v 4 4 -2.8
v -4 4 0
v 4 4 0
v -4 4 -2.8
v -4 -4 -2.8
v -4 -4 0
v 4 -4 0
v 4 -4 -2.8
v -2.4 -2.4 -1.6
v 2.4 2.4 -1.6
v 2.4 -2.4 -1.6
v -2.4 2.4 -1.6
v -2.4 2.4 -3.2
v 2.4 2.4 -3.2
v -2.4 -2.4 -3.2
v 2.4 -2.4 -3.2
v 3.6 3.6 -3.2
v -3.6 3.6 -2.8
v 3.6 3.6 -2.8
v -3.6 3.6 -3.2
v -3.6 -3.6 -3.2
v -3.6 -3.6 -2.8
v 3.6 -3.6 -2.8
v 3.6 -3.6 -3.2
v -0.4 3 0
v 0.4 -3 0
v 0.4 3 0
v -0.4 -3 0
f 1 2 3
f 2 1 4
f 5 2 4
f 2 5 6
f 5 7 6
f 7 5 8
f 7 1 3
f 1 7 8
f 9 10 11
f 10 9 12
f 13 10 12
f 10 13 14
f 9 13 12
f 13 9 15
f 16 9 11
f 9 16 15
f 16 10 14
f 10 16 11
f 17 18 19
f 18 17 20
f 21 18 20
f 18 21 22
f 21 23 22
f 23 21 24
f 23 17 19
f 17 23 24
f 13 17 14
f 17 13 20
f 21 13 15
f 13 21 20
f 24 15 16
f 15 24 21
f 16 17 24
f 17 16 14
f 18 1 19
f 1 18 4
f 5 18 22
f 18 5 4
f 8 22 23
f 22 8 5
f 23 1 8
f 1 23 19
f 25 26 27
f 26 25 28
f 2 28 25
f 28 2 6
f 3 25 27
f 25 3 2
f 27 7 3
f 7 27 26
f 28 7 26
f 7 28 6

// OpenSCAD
// file: ../p/4-4edge.scad
use <../lib.scad>
$fa=1; $fs=0.2;
function ldraw_lib__4_4edge(realsolid=false) = [
// 0 Circle 1.0
// 0 Name: 4-4edge.dat
// 0 Author: James Jessiman
// 0 !LDRAW_ORG Primitive UPDATE 2017-01
// 0 !LICENSE Licensed under CC BY 2.0 and CC BY 4.0 : see CAreadme.txt
// 
// 0 BFC CERTIFY CCW
  [0,"BFC","CERTIFY"],
  [0,"BFC","CCW"],
// 
// 0 !HISTORY 1998-12-15 [PTadmin] Official Update 1998-10
// 0 !HISTORY 2005-12-28 [PTadmin] Official Update 2005-01
// 0 !HISTORY 2007-06-24 [PTadmin] Header formatted for Contributor Agreement
// 0 !HISTORY 2008-07-01 [PTadmin] Official Update 2008-01
// 0 !HISTORY 2017-01-15 [Steffen] BFCed
// 0 !HISTORY 2017-12-30 [PTadmin] Official Update 2017-01
// 
// 
// 2 24 1 0 0 0.9239 0 0.3827
  [2,24,1,0,0,0.9239,0,0.3827],
// 2 24 0.9239 0 0.3827 0.7071 0 0.7071
  [2,24,0.9239,0,0.3827,0.7071,0,0.7071],
// 2 24 0.7071 0 0.7071 0.3827 0 0.9239
  [2,24,0.7071,0,0.7071,0.3827,0,0.9239],
// 2 24 0.3827 0 0.9239 0 0 1
  [2,24,0.3827,0,0.9239,0,0,1],
// 2 24 0 0 1 -0.3827 0 0.9239
  [2,24,0,0,1,-0.3827,0,0.9239],
// 2 24 -0.3827 0 0.9239 -0.7071 0 0.7071
  [2,24,-0.3827,0,0.9239,-0.7071,0,0.7071],
// 2 24 -0.7071 0 0.7071 -0.9239 0 0.3827
  [2,24,-0.7071,0,0.7071,-0.9239,0,0.3827],
// 2 24 -0.9239 0 0.3827 -1 0 -0
  [2,24,-0.9239,0,0.3827,-1,0,-0],
// 2 24 -1 0 -0 -0.9239 0 -0.3827
  [2,24,-1,0,-0,-0.9239,0,-0.3827],
// 2 24 -0.9239 0 -0.3827 -0.7071 0 -0.7071
  [2,24,-0.9239,0,-0.3827,-0.7071,0,-0.7071],
// 2 24 -0.7071 0 -0.7071 -0.3827 0 -0.9239
  [2,24,-0.7071,0,-0.7071,-0.3827,0,-0.9239],
// 2 24 -0.3827 0 -0.9239 0 0 -1
  [2,24,-0.3827,0,-0.9239,0,0,-1],
// 2 24 0 0 -1 0.3827 0 -0.9239
  [2,24,0,0,-1,0.3827,0,-0.9239],
// 2 24 0.3827 0 -0.9239 0.7071 0 -0.7071
  [2,24,0.3827,0,-0.9239,0.7071,0,-0.7071],
// 2 24 0.7071 0 -0.7071 0.9239 0 -0.3827
  [2,24,0.7071,0,-0.7071,0.9239,0,-0.3827],
// 2 24 0.9239 0 -0.3827 1 0 0
  [2,24,0.9239,0,-0.3827,1,0,0],
];
module ldraw_lib__4_4edge(step=0, col=false, unit=2/5, alt=false, line=0.2, solid=!$preview)
    makepoly(ldraw_lib__4_4edge(solid), step=step, col=col, unit=unit, alt=alt, line=line, solid=solid);
ldraw_lib__4_4edge(line=0.2);
// file: ../p/4-4disc.scad
use <../lib.scad>
$fa=1; $fs=0.2;
function ldraw_lib__4_4disc(realsolid=false) = [
// 0 Disc 1.0
// 0 Name: 4-4disc.dat
// 0 Author: James Jessiman
// 0 !LDRAW_ORG Primitive UPDATE 2002-02
// 0 !LICENSE Licensed under CC BY 2.0 and CC BY 4.0 : see CAreadme.txt
// 
// 0 BFC CERTIFY CCW
  [0,"BFC","CERTIFY"],
  [0,"BFC","CCW"],
// 
// 0 !HISTORY 1998-12-15 [PTadmin] Official Update 1998-10
// 0 !HISTORY 2002-03-23 [sbliss] Added BFC statement
// 0 !HISTORY 2002-04-25 [PTadmin] Official Update 2002-02
// 0 !HISTORY 2007-06-24 [PTadmin] Header formatted for Contributor Agreement
// 0 !HISTORY 2008-07-01 [PTadmin] Official Update 2008-01
// 
// 
// 3 16 0 0 0 1 0 0 0.9239 0 0.3827
  [3,16,0,0,0,1,0,0,0.9239,0,0.3827],
// 3 16 0 0 0 0.9239 0 0.3827 0.7071 0 0.7071
  [3,16,0,0,0,0.9239,0,0.3827,0.7071,0,0.7071],
// 3 16 0 0 0 0.7071 0 0.7071 0.3827 0 0.9239
  [3,16,0,0,0,0.7071,0,0.7071,0.3827,0,0.9239],
// 3 16 0 0 0 0.3827 0 0.9239 0 0 1
  [3,16,0,0,0,0.3827,0,0.9239,0,0,1],
// 3 16 0 0 0 0 0 1 -0.3827 0 0.9239
  [3,16,0,0,0,0,0,1,-0.3827,0,0.9239],
// 3 16 0 0 0 -0.3827 0 0.9239 -0.7071 0 0.7071
  [3,16,0,0,0,-0.3827,0,0.9239,-0.7071,0,0.7071],
// 3 16 0 0 0 -0.7071 0 0.7071 -0.9239 0 0.3827
  [3,16,0,0,0,-0.7071,0,0.7071,-0.9239,0,0.3827],
// 3 16 0 0 0 -0.9239 0 0.3827 -1 0 -0
  [3,16,0,0,0,-0.9239,0,0.3827,-1,0,-0],
// 3 16 0 0 0 -1 0 -0 -0.9239 0 -0.3827
  [3,16,0,0,0,-1,0,-0,-0.9239,0,-0.3827],
// 3 16 0 0 0 -0.9239 0 -0.3827 -0.7071 0 -0.7071
  [3,16,0,0,0,-0.9239,0,-0.3827,-0.7071,0,-0.7071],
// 3 16 0 0 0 -0.7071 0 -0.7071 -0.3827 0 -0.9239
  [3,16,0,0,0,-0.7071,0,-0.7071,-0.3827,0,-0.9239],
// 3 16 0 0 0 -0.3827 0 -0.9239 0 0 -1
  [3,16,0,0,0,-0.3827,0,-0.9239,0,0,-1],
// 3 16 0 0 0 0 0 -1 0.3827 0 -0.9239
  [3,16,0,0,0,0,0,-1,0.3827,0,-0.9239],
// 3 16 0 0 0 0.3827 0 -0.9239 0.7071 0 -0.7071
  [3,16,0,0,0,0.3827,0,-0.9239,0.7071,0,-0.7071],
// 3 16 0 0 0 0.7071 0 -0.7071 0.9239 0 -0.3827
  [3,16,0,0,0,0.7071,0,-0.7071,0.9239,0,-0.3827],
// 3 16 0 0 0 0.9239 0 -0.3827 1 0 0
  [3,16,0,0,0,0.9239,0,-0.3827,1,0,0],
// 0
];
module ldraw_lib__4_4disc(step=0, col=false, unit=2/5, alt=false, line=0.2, solid=!$preview)
    makepoly(ldraw_lib__4_4disc(solid), step=step, col=col, unit=unit, alt=alt, line=line, solid=solid);
ldraw_lib__4_4disc(line=0.2);
// file: ../p/4-4cyli.scad
use <../lib.scad>
$fa=1; $fs=0.2;
function ldraw_lib__4_4cyli(realsolid=false) = [
// 0 Cylinder 1.0
// 0 Name: 4-4cyli.dat
// 0 Author: James Jessiman
// 0 !LDRAW_ORG Primitive UPDATE 2005-01
// 0 !LICENSE Licensed under CC BY 2.0 and CC BY 4.0 : see CAreadme.txt
// 
// 0 BFC CERTIFY CCW
  [0,"BFC","CERTIFY"],
  [0,"BFC","CCW"],
// 
// 0 !HISTORY 1998-12-15 [PTadmin] Official Update 1998-10
// 0 !HISTORY 2002-03-23 [sbliss] Added BFC statement; merged headers from files in distributions LDraw 0.27 and Complete.
// 0 !HISTORY 2002-04-25 [PTadmin] Official Update 2002-02
// 0 !HISTORY 2004-12-14 [guyvivan] BFC CCW
// 0 !HISTORY 2005-12-28 [PTadmin] Official Update 2005-01
// 0 !HISTORY 2007-06-24 [PTadmin] Header formatted for Contributor Agreement
// 0 !HISTORY 2008-07-01 [PTadmin] Official Update 2008-01
// 
// 
// 4 16 1 1 0 0.9239 1 0.3827 0.9239 0 0.3827 1 0 0
  [4,16,1,1,0,0.9239,1,0.3827,0.9239,0,0.3827,1,0,0],
// 5 24 1 0 0 1 1 0 0.9239 0 0.3827 0.9239 0 -0.3827
  [5,24,1,0,0,1,1,0,0.9239,0,0.3827,0.9239,0,-0.3827],
// 4 16 0.9239 1 0.3827 0.7071 1 0.7071 0.7071 0 0.7071 0.9239 0 0.3827
  [4,16,0.9239,1,0.3827,0.7071,1,0.7071,0.7071,0,0.7071,0.9239,0,0.3827],
// 5 24 0.9239 0 0.3827 0.9239 1 0.3827 0.7071 0 0.7071 1 0 0
  [5,24,0.9239,0,0.3827,0.9239,1,0.3827,0.7071,0,0.7071,1,0,0],
// 4 16 0.7071 1 0.7071 0.3827 1 0.9239 0.3827 0 0.9239 0.7071 0 0.7071
  [4,16,0.7071,1,0.7071,0.3827,1,0.9239,0.3827,0,0.9239,0.7071,0,0.7071],
// 5 24 0.7071 0 0.7071 0.7071 1 0.7071 0.3827 0 0.9239 0.9239 0 0.3827
  [5,24,0.7071,0,0.7071,0.7071,1,0.7071,0.3827,0,0.9239,0.9239,0,0.3827],
// 4 16 0.3827 1 0.9239 0 1 1 0 0 1 0.3827 0 0.9239
  [4,16,0.3827,1,0.9239,0,1,1,0,0,1,0.3827,0,0.9239],
// 5 24 0.3827 0 0.9239 0.3827 1 0.9239 0 0 1 0.7071 0 0.7071
  [5,24,0.3827,0,0.9239,0.3827,1,0.9239,0,0,1,0.7071,0,0.7071],
// 4 16 0 1 1 -0.3827 1 0.9239 -0.3827 0 0.9239 0 0 1
  [4,16,0,1,1,-0.3827,1,0.9239,-0.3827,0,0.9239,0,0,1],
// 5 24 0 0 1 0 1 1 -0.3827 0 0.9239 0.3827 0 0.9239
  [5,24,0,0,1,0,1,1,-0.3827,0,0.9239,0.3827,0,0.9239],
// 4 16 -0.3827 1 0.9239 -0.7071 1 0.7071 -0.7071 0 0.7071 -0.3827 0 0.9239
  [4,16,-0.3827,1,0.9239,-0.7071,1,0.7071,-0.7071,0,0.7071,-0.3827,0,0.9239],
// 5 24 -0.3827 0 0.9239 -0.3827 1 0.9239 -0.7071 0 0.7071 0 0 1
  [5,24,-0.3827,0,0.9239,-0.3827,1,0.9239,-0.7071,0,0.7071,0,0,1],
// 4 16 -0.7071 1 0.7071 -0.9239 1 0.3827 -0.9239 0 0.3827 -0.7071 0 0.7071
  [4,16,-0.7071,1,0.7071,-0.9239,1,0.3827,-0.9239,0,0.3827,-0.7071,0,0.7071],
// 5 24 -0.7071 0 0.7071 -0.7071 1 0.7071 -0.9239 0 0.3827 -0.3827 0 0.9239
  [5,24,-0.7071,0,0.7071,-0.7071,1,0.7071,-0.9239,0,0.3827,-0.3827,0,0.9239],
// 4 16 -0.9239 1 0.3827 -1 1 0 -1 0 0 -0.9239 0 0.3827
  [4,16,-0.9239,1,0.3827,-1,1,0,-1,0,0,-0.9239,0,0.3827],
// 5 24 -0.9239 0 0.3827 -0.9239 1 0.3827 -1 0 0 -0.7071 0 0.7071
  [5,24,-0.9239,0,0.3827,-0.9239,1,0.3827,-1,0,0,-0.7071,0,0.7071],
// 4 16 -1 1 0 -0.9239 1 -0.3827 -0.9239 0 -0.3827 -1 0 0
  [4,16,-1,1,0,-0.9239,1,-0.3827,-0.9239,0,-0.3827,-1,0,0],
// 5 24 -1 0 0 -1 1 0 -0.9239 0 -0.3827 -0.9239 0 0.3827
  [5,24,-1,0,0,-1,1,0,-0.9239,0,-0.3827,-0.9239,0,0.3827],
// 4 16 -0.9239 1 -0.3827 -0.7071 1 -0.7071 -0.7071 0 -0.7071 -0.9239 0 -0.3827
  [4,16,-0.9239,1,-0.3827,-0.7071,1,-0.7071,-0.7071,0,-0.7071,-0.9239,0,-0.3827],
// 5 24 -0.9239 0 -0.3827 -0.9239 1 -0.3827 -0.7071 0 -0.7071 -1 0 0
  [5,24,-0.9239,0,-0.3827,-0.9239,1,-0.3827,-0.7071,0,-0.7071,-1,0,0],
// 4 16 -0.7071 1 -0.7071 -0.3827 1 -0.9239 -0.3827 0 -0.9239 -0.7071 0 -0.7071
  [4,16,-0.7071,1,-0.7071,-0.3827,1,-0.9239,-0.3827,0,-0.9239,-0.7071,0,-0.7071],
// 5 24 -0.7071 0 -0.7071 -0.7071 1 -0.7071 -0.3827 0 -0.9239 -0.9239 0 -0.3827
  [5,24,-0.7071,0,-0.7071,-0.7071,1,-0.7071,-0.3827,0,-0.9239,-0.9239,0,-0.3827],
// 4 16 -0.3827 1 -0.9239 0 1 -1 0 0 -1 -0.3827 0 -0.9239
  [4,16,-0.3827,1,-0.9239,0,1,-1,0,0,-1,-0.3827,0,-0.9239],
// 5 24 -0.3827 0 -0.9239 -0.3827 1 -0.9239 0 0 -1 -0.7071 0 -0.7071
  [5,24,-0.3827,0,-0.9239,-0.3827,1,-0.9239,0,0,-1,-0.7071,0,-0.7071],
// 4 16 0 1 -1 0.3827 1 -0.9239 0.3827 0 -0.9239 0 0 -1
  [4,16,0,1,-1,0.3827,1,-0.9239,0.3827,0,-0.9239,0,0,-1],
// 5 24 0 0 -1 0 1 -1 0.3827 0 -0.9239 -0.3827 0 -0.9239
  [5,24,0,0,-1,0,1,-1,0.3827,0,-0.9239,-0.3827,0,-0.9239],
// 4 16 0.3827 1 -0.9239 0.7071 1 -0.7071 0.7071 0 -0.7071 0.3827 0 -0.9239
  [4,16,0.3827,1,-0.9239,0.7071,1,-0.7071,0.7071,0,-0.7071,0.3827,0,-0.9239],
// 5 24 0.3827 0 -0.9239 0.3827 1 -0.9239 0.7071 0 -0.7071 0 0 -1
  [5,24,0.3827,0,-0.9239,0.3827,1,-0.9239,0.7071,0,-0.7071,0,0,-1],
// 4 16 0.7071 1 -0.7071 0.9239 1 -0.3827 0.9239 0 -0.3827 0.7071 0 -0.7071
  [4,16,0.7071,1,-0.7071,0.9239,1,-0.3827,0.9239,0,-0.3827,0.7071,0,-0.7071],
// 5 24 0.7071 0 -0.7071 0.7071 1 -0.7071 0.9239 0 -0.3827 0.3827 0 -0.9239
  [5,24,0.7071,0,-0.7071,0.7071,1,-0.7071,0.9239,0,-0.3827,0.3827,0,-0.9239],
// 4 16 0.9239 1 -0.3827 1 1 0 1 0 0 0.9239 0 -0.3827
  [4,16,0.9239,1,-0.3827,1,1,0,1,0,0,0.9239,0,-0.3827],
// 5 24 0.9239 0 -0.3827 0.9239 1 -0.3827 1 0 0 0.7071 0 -0.7071
  [5,24,0.9239,0,-0.3827,0.9239,1,-0.3827,1,0,0,0.7071,0,-0.7071],
// 0
];
module ldraw_lib__4_4cyli(step=0, col=false, unit=2/5, alt=false, line=0.2, solid=!$preview)
    makepoly(ldraw_lib__4_4cyli(solid), step=step, col=col, unit=unit, alt=alt, line=line, solid=solid);
ldraw_lib__4_4cyli(line=0.2);
// file: ../p/stud3.scad
use <../lib.scad>
use <4-4cyli.scad>
use <4-4disc.scad>
use <4-4edge.scad>
$fa=1; $fs=0.2;
function ldraw_lib__stud3(realsolid=false) = realsolid ? 
    [openscad(translate([0,0,-eps()], o=cylinder(4+eps(), r=4)),2)] : [
// 0 Stud Tube Solid
// 0 Name: stud3.dat
// 0 Author: James Jessiman
// 0 !LDRAW_ORG Primitive UPDATE 2012-01
// 0 !LICENSE Licensed under CC BY 2.0 and CC BY 4.0 : see CAreadme.txt
// 
// 0 BFC CERTIFY CCW
  [0,"BFC","CERTIFY"],
  [0,"BFC","CCW"],
// 
// 0 !HISTORY 2002-04-04 [sbliss] Modified for BFC compliance
// 0 !HISTORY 2002-04-25 [PTadmin] Official Update 2002-02
// 0 !HISTORY 2007-06-24 [PTadmin] Header formatted for Contributor Agreement
// 0 !HISTORY 2008-07-01 [PTadmin] Official Update 2008-01
// 0 !HISTORY 2012-02-16 [Philo] Changed to CCW
// 0 !HISTORY 2012-03-30 [PTadmin] Official Update 2012-01
// 
// 
// 1 16 0 -4 0 4 0 0 0 1 0 0 0 4 4-4edge.dat
  [1,16,0,-4,0,4,0,0,0,1,0,0,0,4, ldraw_lib__4_4edge(realsolid)],
// 1 16 0 0 0 4 0 0 0 1 0 0 0 4 4-4edge.dat
  [1,16,0,0,0,4,0,0,0,1,0,0,0,4, ldraw_lib__4_4edge(realsolid)],
// 1 16 0 -4 0 4 0 0 0 1 0 0 0 4 4-4disc.dat
  [1,16,0,-4,0,4,0,0,0,1,0,0,0,4, ldraw_lib__4_4disc(realsolid)],
// 1 16 0 -4 0 4 0 0 0 4 0 0 0 4 4-4cyli.dat
  [1,16,0,-4,0,4,0,0,0,4,0,0,0,4, ldraw_lib__4_4cyli(realsolid)],
];
module ldraw_lib__stud3(step=0, col=false, unit=2/5, alt=false, line=0.2, solid=!$preview)
    makepoly(ldraw_lib__stud3(solid), step=step, col=col, unit=unit, alt=alt, line=line, solid=solid);
ldraw_lib__stud3(line=0.2);
// file: ../p/stud.scad
use <../lib.scad>
use <4-4cyli.scad>
use <4-4disc.scad>
use <4-4edge.scad>
$fa=1; $fs=0.2;
function ldraw_lib__stud(realsolid=false) = realsolid ? 
    [openscad(translate([0,0,-eps()], o=cylinder(4+eps(), r=6)),2)] : [
// 0 Stud
// 0 Name: stud.dat
// 0 Author: James Jessiman
// 0 !LDRAW_ORG Primitive UPDATE 2012-01
// 0 !LICENSE Licensed under CC BY 2.0 and CC BY 4.0 : see CAreadme.txt
// 
// 0 BFC CERTIFY CCW
  [0,"BFC","CERTIFY"],
  [0,"BFC","CCW"],
// 
// 0 !HISTORY 2002-04-04 [sbliss] Modified for BFC compliance
// 0 !HISTORY 2002-04-25 [PTadmin] Official Update 2002-02
// 0 !HISTORY 2007-06-24 [PTadmin] Header formatted for Contributor Agreement
// 0 !HISTORY 2008-07-01 [PTadmin] Official Update 2008-01
// 0 !HISTORY 2012-02-16 [Philo] Changed to CCW
// 0 !HISTORY 2012-03-30 [PTadmin] Official Update 2012-01
// 
// 
// 1 16 0 0 0 6 0 0 0 1 0 0 0 6 4-4edge.dat
  [1,16,0,0,0,6,0,0,0,1,0,0,0,6, ldraw_lib__4_4edge(realsolid)],
// 1 16 0 -4 0 6 0 0 0 1 0 0 0 6 4-4edge.dat
  [1,16,0,-4,0,6,0,0,0,1,0,0,0,6, ldraw_lib__4_4edge(realsolid)],
// 1 16 0 0 0 6 0 0 0 -4 0 0 0 6 4-4cyli.dat
  [1,16,0,0,0,6,0,0,0,-4,0,0,0,6, ldraw_lib__4_4cyli(realsolid)],
// 1 16 0 -4 0 6 0 0 0 1 0 0 0 6 4-4disc.dat
  [1,16,0,-4,0,6,0,0,0,1,0,0,0,6, ldraw_lib__4_4disc(realsolid)],
];
module ldraw_lib__stud(step=0, col=false, unit=2/5, alt=false, line=0.2, solid=!$preview)
    makepoly(ldraw_lib__stud(solid), step=step, col=col, unit=unit, alt=alt, line=line, solid=solid);
ldraw_lib__stud(line=0.2);
// file: ../p/box4t.scad
use <../lib.scad>
$fa=1; $fs=0.2;
function ldraw_lib__box4t(realsolid=false) = [
// 0 Box with 4 Adjacent Faces and All Edges
// 0 Name: box4t.dat
// 0 Author: Tore Eriksson [Tore_Eriksson]
// 0 !LDRAW_ORG Primitive UPDATE 2003-02
// 0 !LICENSE Licensed under CC BY 2.0 and CC BY 4.0 : see CAreadme.txt
// 
// 0 BFC CERTIFY CCW
  [0,"BFC","CERTIFY"],
  [0,"BFC","CCW"],
// 
// 0 !HISTORY 1997-09-29 [PTadmin] Official Update 1997-15
// 0 !HISTORY 2002-08-31 [izanette] Modified with WINDZ for BFC compliance
// 0 !HISTORY 2003-08-01 [PTadmin] Official Update 2003-02
// 0 !HISTORY 2007-06-24 [PTadmin] Header formatted for Contributor Agreement
// 0 !HISTORY 2008-07-01 [PTadmin] Official Update 2008-01
// 
// 
// 2 24 1 1 1 -1 1 1
  [2,24,1,1,1,-1,1,1],
// 2 24 -1 1 1 -1 1 -1
  [2,24,-1,1,1,-1,1,-1],
// 2 24 -1 1 -1 1 1 -1
  [2,24,-1,1,-1,1,1,-1],
// 2 24 1 1 -1 1 1 1
  [2,24,1,1,-1,1,1,1],
// 2 24 1 0 1 -1 0 1
  [2,24,1,0,1,-1,0,1],
// 2 24 -1 0 1 -1 0 -1
  [2,24,-1,0,1,-1,0,-1],
// 2 24 -1 0 -1 1 0 -1
  [2,24,-1,0,-1,1,0,-1],
// 2 24 1 0 -1 1 0 1
  [2,24,1,0,-1,1,0,1],
// 2 24 1 0 1 1 1 1
  [2,24,1,0,1,1,1,1],
// 2 24 -1 0 1 -1 1 1
  [2,24,-1,0,1,-1,1,1],
// 2 24 1 0 -1 1 1 -1
  [2,24,1,0,-1,1,1,-1],
// 2 24 -1 0 -1 -1 1 -1
  [2,24,-1,0,-1,-1,1,-1],
// 4 16 1 1 1 1 1 -1 -1 1 -1 -1 1 1
  [4,16,1,1,1,1,1,-1,-1,1,-1,-1,1,1],
// 4 16 1 1 1 -1 1 1 -1 0 1 1 0 1
  [4,16,1,1,1,-1,1,1,-1,0,1,1,0,1],
// 4 16 -1 1 1 -1 1 -1 -1 0 -1 -1 0 1
  [4,16,-1,1,1,-1,1,-1,-1,0,-1,-1,0,1],
// 0 4 16 -1 1 -1 -1 0 -1 1 0 -1 1 1 -1
// 4 16 1 1 -1 1 1 1 1 0 1 1 0 -1
  [4,16,1,1,-1,1,1,1,1,0,1,1,0,-1],
// 0
];
module ldraw_lib__box4t(step=0, col=false, unit=2/5, alt=false, line=0.2, solid=!$preview)
    makepoly(ldraw_lib__box4t(solid), step=step, col=col, unit=unit, alt=alt, line=line, solid=solid);
ldraw_lib__box4t(line=0.2);
// file: s/3004s01.scad
use <../../lib.scad>
use <../../p/box4t.scad>
use <../../p/box5.scad>
use <../../p/stud.scad>
use <../../p/stud3.scad>
$fa=1; $fs=0.2;
function ldraw_lib__s__3004s01(realsolid=false) = [
// 0 ~Brick  1 x  2 without Front Face
// 0 Name: s\3004s01.dat
// 0 Author: James Jessiman
// 0 !LDRAW_ORG Subpart UPDATE 2003-03
// 0 !LICENSE Licensed under CC BY 2.0 and CC BY 4.0 : see CAreadme.txt
// 
// 0 BFC CERTIFY CCW
  [0,"BFC","CERTIFY"],
  [0,"BFC","CCW"],
// 
// 0 !HISTORY 2003-09-07 [jriley] Subfiling, BFC
// 0 !HISTORY 2003-12-19 [PTadmin] Official Update 2003-03
// 0 !HISTORY 2007-08-29 [PTadmin] Header formatted for Contributor Agreement
// 0 !HISTORY 2008-07-01 [PTadmin] Official Update 2008-01
// 
// 
// 1 16 0 4 0 1 0 0 0 -5 0 0 0 1 stud3.dat
  [1,16,0,4,0,1,0,0,0,-5,0,0,0,1, ldraw_lib__stud3(realsolid)],
// 0 BFC INVERTNEXT
  [0,"BFC","INVERTNEXT"],
// 1 16 0 24 0 16 0 0 0 -20 0 0 0 6 box5.dat
  [1,16,0,24,0,16,0,0,0,-20,0,0,0,6, ldraw_lib__box5(realsolid)],
// 4 16 20 24 10 16 24 6 -16 24 6 -20 24 10
  [4,16,20,24,10,16,24,6,-16,24,6,-20,24,10],
// 4 16 -20 24 10 -16 24 6 -16 24 -6 -20 24 -10
  [4,16,-20,24,10,-16,24,6,-16,24,-6,-20,24,-10],
// 4 16 -20 24 -10 -16 24 -6 16 24 -6 20 24 -10
  [4,16,-20,24,-10,-16,24,-6,16,24,-6,20,24,-10],
// 4 16 20 24 -10 16 24 -6 16 24 6 20 24 10
  [4,16,20,24,-10,16,24,-6,16,24,6,20,24,10],
// 1 16 0 24 0 20 0 0 0 -24 0 0 0 10 box4t.dat
  [1,16,0,24,0,20,0,0,0,-24,0,0,0,10, ldraw_lib__box4t(realsolid)],
// 1 16 10 0 0 1 0 0 0 1 0 0 0 1 stud.dat
  [1,16,10,0,0,1,0,0,0,1,0,0,0,1, ldraw_lib__stud(realsolid)],
// 1 16 -10 0 0 1 0 0 0 1 0 0 0 1 stud.dat
  [1,16,-10,0,0,1,0,0,0,1,0,0,0,1, ldraw_lib__stud(realsolid)],
// 0
];
module ldraw_lib__s__3004s01(step=0, col=false, unit=2/5, alt=false, line=0.2, solid=!$preview)
    makepoly(ldraw_lib__s__3004s01(solid), step=step, col=col, unit=unit, alt=alt, line=line, solid=solid);
ldraw_lib__s__3004s01(line=0.2);
// file: ../p/box5.scad
use <../lib.scad>
$fa=1; $fs=0.2;
function ldraw_lib__box5(realsolid=false) = [
// 0 Box with 5 Faces and All Edges
// 0 Name: box5.dat
// 0 Author: James Jessiman
// 0 !LDRAW_ORG Primitive UPDATE 2012-01
// 0 !LICENSE Licensed under CC BY 2.0 and CC BY 4.0 : see CAreadme.txt
// 
// 0 BFC CERTIFY CCW
  [0,"BFC","CERTIFY"],
  [0,"BFC","CCW"],
// 
// 0 !HISTORY 2002-04-03 [sbliss] Modified for BFC compliance
// 0 !HISTORY 2002-04-25 [PTadmin] Official Update 2002-02
// 0 !HISTORY 2007-06-24 [PTadmin] Header formatted for Contributor Agreement
// 0 !HISTORY 2008-07-01 [PTadmin] Official Update 2008-01
// 0 !HISTORY 2012-02-16 [Philo] Changed to CCW
// 0 !HISTORY 2012-03-30 [PTadmin] Official Update 2012-01
// 
// 
// 2 24 1 1 1 -1 1 1
  [2,24,1,1,1,-1,1,1],
// 2 24 -1 1 1 -1 1 -1
  [2,24,-1,1,1,-1,1,-1],
// 2 24 -1 1 -1 1 1 -1
  [2,24,-1,1,-1,1,1,-1],
// 2 24 1 1 -1 1 1 1
  [2,24,1,1,-1,1,1,1],
// 2 24 1 0 1 -1 0 1
  [2,24,1,0,1,-1,0,1],
// 2 24 -1 0 1 -1 0 -1
  [2,24,-1,0,1,-1,0,-1],
// 2 24 -1 0 -1 1 0 -1
  [2,24,-1,0,-1,1,0,-1],
// 2 24 1 0 -1 1 0 1
  [2,24,1,0,-1,1,0,1],
// 2 24 1 0 1 1 1 1
  [2,24,1,0,1,1,1,1],
// 2 24 -1 0 1 -1 1 1
  [2,24,-1,0,1,-1,1,1],
// 2 24 1 0 -1 1 1 -1
  [2,24,1,0,-1,1,1,-1],
// 2 24 -1 0 -1 -1 1 -1
  [2,24,-1,0,-1,-1,1,-1],
// 4 16 -1 1 1 1 1 1 1 1 -1 -1 1 -1
  [4,16,-1,1,1,1,1,1,1,1,-1,-1,1,-1],
// 4 16 -1 1 1 -1 0 1 1 0 1 1 1 1
  [4,16,-1,1,1,-1,0,1,1,0,1,1,1,1],
// 4 16 -1 1 -1 -1 0 -1 -1 0 1 -1 1 1
  [4,16,-1,1,-1,-1,0,-1,-1,0,1,-1,1,1],
// 4 16 1 1 -1 1 0 -1 -1 0 -1 -1 1 -1
  [4,16,1,1,-1,1,0,-1,-1,0,-1,-1,1,-1],
// 4 16 1 1 1 1 0 1 1 0 -1 1 1 -1
  [4,16,1,1,1,1,0,1,1,0,-1,1,1,-1],
];
module ldraw_lib__box5(step=0, col=false, unit=2/5, alt=false, line=0.2, solid=!$preview)
    makepoly(ldraw_lib__box5(solid), step=step, col=col, unit=unit, alt=alt, line=line, solid=solid);
ldraw_lib__box5(line=0.2);
// file: ../p/box4.scad
use <../lib.scad>
$fa=1; $fs=0.2;
function ldraw_lib__box4(realsolid=false) = [
// 0 Box with 4 Faces (2 Parallel Pairs) and All Edges
// 0 Name: box4.dat
// 0 Author: James Jessiman
// 0 !LDRAW_ORG Primitive UPDATE 2012-01
// 0 !LICENSE Licensed under CC BY 2.0 and CC BY 4.0 : see CAreadme.txt
// 
// 0 BFC CERTIFY CCW
  [0,"BFC","CERTIFY"],
  [0,"BFC","CCW"],
// 
// 0 !HISTORY 2002-04-03 [sbliss] Modified for BFC compliance
// 0 !HISTORY 2002-04-25 [PTadmin] Official Update 2002-02
// 0 !HISTORY 2007-06-24 [PTadmin] Header formatted for Contributor Agreement
// 0 !HISTORY 2008-07-01 [PTadmin] Official Update 2008-01
// 0 !HISTORY 2012-02-16 [Philo] Changed to CCW
// 0 !HISTORY 2012-03-30 [PTadmin] Official Update 2012-01
// 
// 
// 2 24 1 1 1 -1 1 1
  [2,24,1,1,1,-1,1,1],
// 2 24 -1 1 1 -1 1 -1
  [2,24,-1,1,1,-1,1,-1],
// 2 24 -1 1 -1 1 1 -1
  [2,24,-1,1,-1,1,1,-1],
// 2 24 1 1 -1 1 1 1
  [2,24,1,1,-1,1,1,1],
// 2 24 1 0 1 -1 0 1
  [2,24,1,0,1,-1,0,1],
// 2 24 -1 0 1 -1 0 -1
  [2,24,-1,0,1,-1,0,-1],
// 2 24 -1 0 -1 1 0 -1
  [2,24,-1,0,-1,1,0,-1],
// 2 24 1 0 -1 1 0 1
  [2,24,1,0,-1,1,0,1],
// 2 24 1 0 1 1 1 1
  [2,24,1,0,1,1,1,1],
// 2 24 -1 0 1 -1 1 1
  [2,24,-1,0,1,-1,1,1],
// 2 24 1 0 -1 1 1 -1
  [2,24,1,0,-1,1,1,-1],
// 2 24 -1 0 -1 -1 1 -1
  [2,24,-1,0,-1,-1,1,-1],
// 4 16 -1 1 1 -1 0 1 1 0 1 1 1 1
  [4,16,-1,1,1,-1,0,1,1,0,1,1,1,1],
// 4 16 -1 1 -1 -1 0 -1 -1 0 1 -1 1 1
  [4,16,-1,1,-1,-1,0,-1,-1,0,1,-1,1,1],
// 4 16 1 1 -1 1 0 -1 -1 0 -1 -1 1 -1
  [4,16,1,1,-1,1,0,-1,-1,0,-1,-1,1,-1],
// 4 16 1 1 1 1 0 1 1 0 -1 1 1 -1
  [4,16,1,1,1,1,0,1,1,0,-1,1,1,-1],
];
module ldraw_lib__box4(step=0, col=false, unit=2/5, alt=false, line=0.2, solid=!$preview)
    makepoly(ldraw_lib__box4(solid), step=step, col=col, unit=unit, alt=alt, line=line, solid=solid);
ldraw_lib__box4(line=0.2);
// file: 3004.scad
use <../lib.scad>
use <s/3004s01.scad>
$fa=1; $fs=0.2;
function ldraw_lib__3004(realsolid=false) = [
// 0 Brick  1 x  2
// 0 Name: 3004.dat
// 0 Author: James Jessiman
// 0 !LDRAW_ORG Part UPDATE 2022-05
// 0 !LICENSE Licensed under CC BY 2.0 and CC BY 4.0 : see CAreadme.txt
// 
// 0 BFC CERTIFY CCW
  [0,"BFC","CERTIFY"],
  [0,"BFC","CCW"],
// 
// 0 !HISTORY 2001-10-26 [PTadmin] Official Update 2001-01
// 0 !HISTORY 2002-05-07 {unknown} BFC Certification
// 0 !HISTORY 2002-06-11 [PTadmin] Official Update 2002-03
// 0 !HISTORY 2007-05-07 [PTadmin] Header formatted for Contributor Agreement
// 0 !HISTORY 2008-07-01 [PTadmin] Official Update 2008-01
// 0 !HISTORY 2022-08-04 [MagFors] Using subfile
// 0 !HISTORY 2022-09-15 [PTadmin] Official Update 2022-05
// 
// 
// 1 16 0 0 0 1 0 0 0 1 0 0 0 1 s\3004s01.dat
  [1,16,0,0,0,1,0,0,0,1,0,0,0,1, ldraw_lib__s__3004s01(realsolid)],
// 4 16 -20 24 -10 20 24 -10 20 0 -10 -20 0 -10
  [4,16,-20,24,-10,20,24,-10,20,0,-10,-20,0,-10],
];
module ldraw_lib__3004(step=0, col=false, unit=2/5, alt=false, line=0.2, solid=!$preview)
    makepoly(ldraw_lib__3004(solid), step=step, col=col, unit=unit, alt=alt, line=line, solid=solid);
ldraw_lib__3004(line=0.2);
// file: s/3070bs01.scad
use <../../lib.scad>
use <../../p/box4.scad>
use <../../p/box5.scad>
$fa=1; $fs=0.2;
function ldraw_lib__s__3070bs01(realsolid=false) = [
// 0 ~Tile  1 x  1 with Groove without Top Face
// 0 Name: s\3070bs01.dat
// 0 Author: Chris Dee [cwdee]
// 0 !LDRAW_ORG Subpart UPDATE 2009-02
// 0 !LICENSE Licensed under CC BY 2.0 and CC BY 4.0 : see CAreadme.txt
// 
// 0 BFC CERTIFY CCW
  [0,"BFC","CERTIFY"],
  [0,"BFC","CCW"],
// 
// 0 !HISTORY 2009-09-03 [PTadmin] Official Update 2009-02
// 
// 
// 1 16 0 0 0 10 0 0 0 7 0 0 0 10 box4.dat
  [1,16,0,0,0,10,0,0,0,7,0,0,0,10, ldraw_lib__box4(realsolid)],
// 0 BFC INVERTNEXT
  [0,"BFC","INVERTNEXT"],
// 1 16 0 8 0 6 0 0 0 -4 0 0 0 6 box5.dat
  [1,16,0,8,0,6,0,0,0,-4,0,0,0,6, ldraw_lib__box5(realsolid)],
// 1 16 0 7 0 9 0 0 0 1 0 0 0 9 box4.dat
  [1,16,0,7,0,9,0,0,0,1,0,0,0,9, ldraw_lib__box4(realsolid)],
// 
// 4 16 9 8 9 6 8 6 -6 8 6 -9 8 9
  [4,16,9,8,9,6,8,6,-6,8,6,-9,8,9],
// 4 16 -9 8 9 -6 8 6 -6 8 -6 -9 8 -9
  [4,16,-9,8,9,-6,8,6,-6,8,-6,-9,8,-9],
// 4 16 -9 8 -9 -6 8 -6 6 8 -6 9 8 -9
  [4,16,-9,8,-9,-6,8,-6,6,8,-6,9,8,-9],
// 4 16 9 8 -9 6 8 -6 6 8 6 9 8 9
  [4,16,9,8,-9,6,8,-6,6,8,6,9,8,9],
// 
// 4 16 10 7 10 9 7 9 -9 7 9 -10 7 10
  [4,16,10,7,10,9,7,9,-9,7,9,-10,7,10],
// 4 16 -10 7 10 -9 7 9 -9 7 -9 -10 7 -10
  [4,16,-10,7,10,-9,7,9,-9,7,-9,-10,7,-10],
// 4 16 -10 7 -10 -9 7 -9 9 7 -9 10 7 -10
  [4,16,-10,7,-10,-9,7,-9,9,7,-9,10,7,-10],
// 4 16 10 7 -10 9 7 -9 9 7 9 10 7 10
  [4,16,10,7,-10,9,7,-9,9,7,9,10,7,10],
// 0
];
module ldraw_lib__s__3070bs01(step=0, col=false, unit=2/5, alt=false, line=0.2, solid=!$preview)
    makepoly(ldraw_lib__s__3070bs01(solid), step=step, col=col, unit=unit, alt=alt, line=line, solid=solid);
ldraw_lib__s__3070bs01(line=0.2);
// file: s/3070bati.scad
use <../../lib.scad>
$fa=1; $fs=0.2;
function ldraw_lib__s__3070bati(realsolid=false) = [
// 0 ~Tile  1 x  1 with "I" Pattern
// 0 Name: s\3070bati.dat
// 0 Author: Chris Dee [cwdee]
// 0 !LDRAW_ORG Subpart UPDATE 2009-01
// 0 !LICENSE Licensed under CC BY 2.0 and CC BY 4.0 : see CAreadme.txt
// 
// 0 BFC CERTIFY CW
  [0,"BFC","CERTIFY"],
  [0,"BFC","CW"],
// 
// 0 !HISTORY 2009-05-02 [PTadmin] Official Update 2009-01
// 
// 
// 4 16 -1 0 7.5 1 0 7.5 1 0 -7.5 -1 0 -7.5
  [4,16,-1,0,7.5,1,0,7.5,1,0,-7.5,-1,0,-7.5],
// 0
];
module ldraw_lib__s__3070bati(step=0, col=false, unit=2/5, alt=false, line=0.2, solid=!$preview)
    makepoly(ldraw_lib__s__3070bati(solid), step=step, col=col, unit=unit, alt=alt, line=line, solid=solid);
ldraw_lib__s__3070bati(line=0.2);
// main file
use <../lib.scad>
use <s/3070bati.scad>
use <s/3070bs01.scad>
$fa=1; $fs=0.2;
function ldraw_lib__3070bpti(realsolid=false) = [
// 0 Tile  1 x  1 with Silver "I" Pattern
// 0 Name: 3070bpti.dat
// 0 Author: Chris Dee [cwdee]
// 0 !LDRAW_ORG Part UPDATE 2013-01
// 0 !LICENSE Licensed under CC BY 2.0 and CC BY 4.0 : see CAreadme.txt
// 
// 0 BFC CERTIFY CW
  [0,"BFC","CERTIFY"],
  [0,"BFC","CW"],
// 
// 0 !HISTORY 2009-05-02 [PTadmin] Official Update 2009-01
// 0 !HISTORY 2013-03-09 [MagFors] Changed colour 383 to 80 (printed silver)
// 0 !HISTORY 2013-07-21 [PTadmin] Official Update 2013-01
// 
// 
// 1 16 0 0 0 1 0 0 0 1 0 0 0 1 s\3070bs01.dat
  [1,16,0,0,0,1,0,0,0,1,0,0,0,1, ldraw_lib__s__3070bs01(realsolid)],
// 1 80 0 0 0 1 0 0 0 1 0 0 0 1 s\3070bati.dat
  [1,80,0,0,0,1,0,0,0,1,0,0,0,1, ldraw_lib__s__3070bati(realsolid)],
// 4 16 -1 0 -7.5 -10 0 -10 -10 0 10 -1 0 7.5
  [4,16,-1,0,-7.5,-10,0,-10,-10,0,10,-1,0,7.5],
// 4 16 -1 0 7.5 -10 0 10 10 0 10 1 0 7.5
  [4,16,-1,0,7.5,-10,0,10,10,0,10,1,0,7.5],
// 4 16 1 0 7.5 10 0 10 10 0 -10 1 0 -7.5
  [4,16,1,0,7.5,10,0,10,10,0,-10,1,0,-7.5],
// 4 16 1 0 -7.5 10 0 -10 -10 0 -10 -1 0 -7.5
  [4,16,1,0,-7.5,10,0,-10,-10,0,-10,-1,0,-7.5],
// 
];
module ldraw_lib__3070bpti(step=0, col=false, unit=2/5, alt=false, line=0.2, solid=!$preview)
    makepoly(ldraw_lib__3070bpti(solid), step=step, col=col, unit=unit, alt=alt, line=line, solid=solid);
ldraw_lib__3070bpti(line=0.2);
